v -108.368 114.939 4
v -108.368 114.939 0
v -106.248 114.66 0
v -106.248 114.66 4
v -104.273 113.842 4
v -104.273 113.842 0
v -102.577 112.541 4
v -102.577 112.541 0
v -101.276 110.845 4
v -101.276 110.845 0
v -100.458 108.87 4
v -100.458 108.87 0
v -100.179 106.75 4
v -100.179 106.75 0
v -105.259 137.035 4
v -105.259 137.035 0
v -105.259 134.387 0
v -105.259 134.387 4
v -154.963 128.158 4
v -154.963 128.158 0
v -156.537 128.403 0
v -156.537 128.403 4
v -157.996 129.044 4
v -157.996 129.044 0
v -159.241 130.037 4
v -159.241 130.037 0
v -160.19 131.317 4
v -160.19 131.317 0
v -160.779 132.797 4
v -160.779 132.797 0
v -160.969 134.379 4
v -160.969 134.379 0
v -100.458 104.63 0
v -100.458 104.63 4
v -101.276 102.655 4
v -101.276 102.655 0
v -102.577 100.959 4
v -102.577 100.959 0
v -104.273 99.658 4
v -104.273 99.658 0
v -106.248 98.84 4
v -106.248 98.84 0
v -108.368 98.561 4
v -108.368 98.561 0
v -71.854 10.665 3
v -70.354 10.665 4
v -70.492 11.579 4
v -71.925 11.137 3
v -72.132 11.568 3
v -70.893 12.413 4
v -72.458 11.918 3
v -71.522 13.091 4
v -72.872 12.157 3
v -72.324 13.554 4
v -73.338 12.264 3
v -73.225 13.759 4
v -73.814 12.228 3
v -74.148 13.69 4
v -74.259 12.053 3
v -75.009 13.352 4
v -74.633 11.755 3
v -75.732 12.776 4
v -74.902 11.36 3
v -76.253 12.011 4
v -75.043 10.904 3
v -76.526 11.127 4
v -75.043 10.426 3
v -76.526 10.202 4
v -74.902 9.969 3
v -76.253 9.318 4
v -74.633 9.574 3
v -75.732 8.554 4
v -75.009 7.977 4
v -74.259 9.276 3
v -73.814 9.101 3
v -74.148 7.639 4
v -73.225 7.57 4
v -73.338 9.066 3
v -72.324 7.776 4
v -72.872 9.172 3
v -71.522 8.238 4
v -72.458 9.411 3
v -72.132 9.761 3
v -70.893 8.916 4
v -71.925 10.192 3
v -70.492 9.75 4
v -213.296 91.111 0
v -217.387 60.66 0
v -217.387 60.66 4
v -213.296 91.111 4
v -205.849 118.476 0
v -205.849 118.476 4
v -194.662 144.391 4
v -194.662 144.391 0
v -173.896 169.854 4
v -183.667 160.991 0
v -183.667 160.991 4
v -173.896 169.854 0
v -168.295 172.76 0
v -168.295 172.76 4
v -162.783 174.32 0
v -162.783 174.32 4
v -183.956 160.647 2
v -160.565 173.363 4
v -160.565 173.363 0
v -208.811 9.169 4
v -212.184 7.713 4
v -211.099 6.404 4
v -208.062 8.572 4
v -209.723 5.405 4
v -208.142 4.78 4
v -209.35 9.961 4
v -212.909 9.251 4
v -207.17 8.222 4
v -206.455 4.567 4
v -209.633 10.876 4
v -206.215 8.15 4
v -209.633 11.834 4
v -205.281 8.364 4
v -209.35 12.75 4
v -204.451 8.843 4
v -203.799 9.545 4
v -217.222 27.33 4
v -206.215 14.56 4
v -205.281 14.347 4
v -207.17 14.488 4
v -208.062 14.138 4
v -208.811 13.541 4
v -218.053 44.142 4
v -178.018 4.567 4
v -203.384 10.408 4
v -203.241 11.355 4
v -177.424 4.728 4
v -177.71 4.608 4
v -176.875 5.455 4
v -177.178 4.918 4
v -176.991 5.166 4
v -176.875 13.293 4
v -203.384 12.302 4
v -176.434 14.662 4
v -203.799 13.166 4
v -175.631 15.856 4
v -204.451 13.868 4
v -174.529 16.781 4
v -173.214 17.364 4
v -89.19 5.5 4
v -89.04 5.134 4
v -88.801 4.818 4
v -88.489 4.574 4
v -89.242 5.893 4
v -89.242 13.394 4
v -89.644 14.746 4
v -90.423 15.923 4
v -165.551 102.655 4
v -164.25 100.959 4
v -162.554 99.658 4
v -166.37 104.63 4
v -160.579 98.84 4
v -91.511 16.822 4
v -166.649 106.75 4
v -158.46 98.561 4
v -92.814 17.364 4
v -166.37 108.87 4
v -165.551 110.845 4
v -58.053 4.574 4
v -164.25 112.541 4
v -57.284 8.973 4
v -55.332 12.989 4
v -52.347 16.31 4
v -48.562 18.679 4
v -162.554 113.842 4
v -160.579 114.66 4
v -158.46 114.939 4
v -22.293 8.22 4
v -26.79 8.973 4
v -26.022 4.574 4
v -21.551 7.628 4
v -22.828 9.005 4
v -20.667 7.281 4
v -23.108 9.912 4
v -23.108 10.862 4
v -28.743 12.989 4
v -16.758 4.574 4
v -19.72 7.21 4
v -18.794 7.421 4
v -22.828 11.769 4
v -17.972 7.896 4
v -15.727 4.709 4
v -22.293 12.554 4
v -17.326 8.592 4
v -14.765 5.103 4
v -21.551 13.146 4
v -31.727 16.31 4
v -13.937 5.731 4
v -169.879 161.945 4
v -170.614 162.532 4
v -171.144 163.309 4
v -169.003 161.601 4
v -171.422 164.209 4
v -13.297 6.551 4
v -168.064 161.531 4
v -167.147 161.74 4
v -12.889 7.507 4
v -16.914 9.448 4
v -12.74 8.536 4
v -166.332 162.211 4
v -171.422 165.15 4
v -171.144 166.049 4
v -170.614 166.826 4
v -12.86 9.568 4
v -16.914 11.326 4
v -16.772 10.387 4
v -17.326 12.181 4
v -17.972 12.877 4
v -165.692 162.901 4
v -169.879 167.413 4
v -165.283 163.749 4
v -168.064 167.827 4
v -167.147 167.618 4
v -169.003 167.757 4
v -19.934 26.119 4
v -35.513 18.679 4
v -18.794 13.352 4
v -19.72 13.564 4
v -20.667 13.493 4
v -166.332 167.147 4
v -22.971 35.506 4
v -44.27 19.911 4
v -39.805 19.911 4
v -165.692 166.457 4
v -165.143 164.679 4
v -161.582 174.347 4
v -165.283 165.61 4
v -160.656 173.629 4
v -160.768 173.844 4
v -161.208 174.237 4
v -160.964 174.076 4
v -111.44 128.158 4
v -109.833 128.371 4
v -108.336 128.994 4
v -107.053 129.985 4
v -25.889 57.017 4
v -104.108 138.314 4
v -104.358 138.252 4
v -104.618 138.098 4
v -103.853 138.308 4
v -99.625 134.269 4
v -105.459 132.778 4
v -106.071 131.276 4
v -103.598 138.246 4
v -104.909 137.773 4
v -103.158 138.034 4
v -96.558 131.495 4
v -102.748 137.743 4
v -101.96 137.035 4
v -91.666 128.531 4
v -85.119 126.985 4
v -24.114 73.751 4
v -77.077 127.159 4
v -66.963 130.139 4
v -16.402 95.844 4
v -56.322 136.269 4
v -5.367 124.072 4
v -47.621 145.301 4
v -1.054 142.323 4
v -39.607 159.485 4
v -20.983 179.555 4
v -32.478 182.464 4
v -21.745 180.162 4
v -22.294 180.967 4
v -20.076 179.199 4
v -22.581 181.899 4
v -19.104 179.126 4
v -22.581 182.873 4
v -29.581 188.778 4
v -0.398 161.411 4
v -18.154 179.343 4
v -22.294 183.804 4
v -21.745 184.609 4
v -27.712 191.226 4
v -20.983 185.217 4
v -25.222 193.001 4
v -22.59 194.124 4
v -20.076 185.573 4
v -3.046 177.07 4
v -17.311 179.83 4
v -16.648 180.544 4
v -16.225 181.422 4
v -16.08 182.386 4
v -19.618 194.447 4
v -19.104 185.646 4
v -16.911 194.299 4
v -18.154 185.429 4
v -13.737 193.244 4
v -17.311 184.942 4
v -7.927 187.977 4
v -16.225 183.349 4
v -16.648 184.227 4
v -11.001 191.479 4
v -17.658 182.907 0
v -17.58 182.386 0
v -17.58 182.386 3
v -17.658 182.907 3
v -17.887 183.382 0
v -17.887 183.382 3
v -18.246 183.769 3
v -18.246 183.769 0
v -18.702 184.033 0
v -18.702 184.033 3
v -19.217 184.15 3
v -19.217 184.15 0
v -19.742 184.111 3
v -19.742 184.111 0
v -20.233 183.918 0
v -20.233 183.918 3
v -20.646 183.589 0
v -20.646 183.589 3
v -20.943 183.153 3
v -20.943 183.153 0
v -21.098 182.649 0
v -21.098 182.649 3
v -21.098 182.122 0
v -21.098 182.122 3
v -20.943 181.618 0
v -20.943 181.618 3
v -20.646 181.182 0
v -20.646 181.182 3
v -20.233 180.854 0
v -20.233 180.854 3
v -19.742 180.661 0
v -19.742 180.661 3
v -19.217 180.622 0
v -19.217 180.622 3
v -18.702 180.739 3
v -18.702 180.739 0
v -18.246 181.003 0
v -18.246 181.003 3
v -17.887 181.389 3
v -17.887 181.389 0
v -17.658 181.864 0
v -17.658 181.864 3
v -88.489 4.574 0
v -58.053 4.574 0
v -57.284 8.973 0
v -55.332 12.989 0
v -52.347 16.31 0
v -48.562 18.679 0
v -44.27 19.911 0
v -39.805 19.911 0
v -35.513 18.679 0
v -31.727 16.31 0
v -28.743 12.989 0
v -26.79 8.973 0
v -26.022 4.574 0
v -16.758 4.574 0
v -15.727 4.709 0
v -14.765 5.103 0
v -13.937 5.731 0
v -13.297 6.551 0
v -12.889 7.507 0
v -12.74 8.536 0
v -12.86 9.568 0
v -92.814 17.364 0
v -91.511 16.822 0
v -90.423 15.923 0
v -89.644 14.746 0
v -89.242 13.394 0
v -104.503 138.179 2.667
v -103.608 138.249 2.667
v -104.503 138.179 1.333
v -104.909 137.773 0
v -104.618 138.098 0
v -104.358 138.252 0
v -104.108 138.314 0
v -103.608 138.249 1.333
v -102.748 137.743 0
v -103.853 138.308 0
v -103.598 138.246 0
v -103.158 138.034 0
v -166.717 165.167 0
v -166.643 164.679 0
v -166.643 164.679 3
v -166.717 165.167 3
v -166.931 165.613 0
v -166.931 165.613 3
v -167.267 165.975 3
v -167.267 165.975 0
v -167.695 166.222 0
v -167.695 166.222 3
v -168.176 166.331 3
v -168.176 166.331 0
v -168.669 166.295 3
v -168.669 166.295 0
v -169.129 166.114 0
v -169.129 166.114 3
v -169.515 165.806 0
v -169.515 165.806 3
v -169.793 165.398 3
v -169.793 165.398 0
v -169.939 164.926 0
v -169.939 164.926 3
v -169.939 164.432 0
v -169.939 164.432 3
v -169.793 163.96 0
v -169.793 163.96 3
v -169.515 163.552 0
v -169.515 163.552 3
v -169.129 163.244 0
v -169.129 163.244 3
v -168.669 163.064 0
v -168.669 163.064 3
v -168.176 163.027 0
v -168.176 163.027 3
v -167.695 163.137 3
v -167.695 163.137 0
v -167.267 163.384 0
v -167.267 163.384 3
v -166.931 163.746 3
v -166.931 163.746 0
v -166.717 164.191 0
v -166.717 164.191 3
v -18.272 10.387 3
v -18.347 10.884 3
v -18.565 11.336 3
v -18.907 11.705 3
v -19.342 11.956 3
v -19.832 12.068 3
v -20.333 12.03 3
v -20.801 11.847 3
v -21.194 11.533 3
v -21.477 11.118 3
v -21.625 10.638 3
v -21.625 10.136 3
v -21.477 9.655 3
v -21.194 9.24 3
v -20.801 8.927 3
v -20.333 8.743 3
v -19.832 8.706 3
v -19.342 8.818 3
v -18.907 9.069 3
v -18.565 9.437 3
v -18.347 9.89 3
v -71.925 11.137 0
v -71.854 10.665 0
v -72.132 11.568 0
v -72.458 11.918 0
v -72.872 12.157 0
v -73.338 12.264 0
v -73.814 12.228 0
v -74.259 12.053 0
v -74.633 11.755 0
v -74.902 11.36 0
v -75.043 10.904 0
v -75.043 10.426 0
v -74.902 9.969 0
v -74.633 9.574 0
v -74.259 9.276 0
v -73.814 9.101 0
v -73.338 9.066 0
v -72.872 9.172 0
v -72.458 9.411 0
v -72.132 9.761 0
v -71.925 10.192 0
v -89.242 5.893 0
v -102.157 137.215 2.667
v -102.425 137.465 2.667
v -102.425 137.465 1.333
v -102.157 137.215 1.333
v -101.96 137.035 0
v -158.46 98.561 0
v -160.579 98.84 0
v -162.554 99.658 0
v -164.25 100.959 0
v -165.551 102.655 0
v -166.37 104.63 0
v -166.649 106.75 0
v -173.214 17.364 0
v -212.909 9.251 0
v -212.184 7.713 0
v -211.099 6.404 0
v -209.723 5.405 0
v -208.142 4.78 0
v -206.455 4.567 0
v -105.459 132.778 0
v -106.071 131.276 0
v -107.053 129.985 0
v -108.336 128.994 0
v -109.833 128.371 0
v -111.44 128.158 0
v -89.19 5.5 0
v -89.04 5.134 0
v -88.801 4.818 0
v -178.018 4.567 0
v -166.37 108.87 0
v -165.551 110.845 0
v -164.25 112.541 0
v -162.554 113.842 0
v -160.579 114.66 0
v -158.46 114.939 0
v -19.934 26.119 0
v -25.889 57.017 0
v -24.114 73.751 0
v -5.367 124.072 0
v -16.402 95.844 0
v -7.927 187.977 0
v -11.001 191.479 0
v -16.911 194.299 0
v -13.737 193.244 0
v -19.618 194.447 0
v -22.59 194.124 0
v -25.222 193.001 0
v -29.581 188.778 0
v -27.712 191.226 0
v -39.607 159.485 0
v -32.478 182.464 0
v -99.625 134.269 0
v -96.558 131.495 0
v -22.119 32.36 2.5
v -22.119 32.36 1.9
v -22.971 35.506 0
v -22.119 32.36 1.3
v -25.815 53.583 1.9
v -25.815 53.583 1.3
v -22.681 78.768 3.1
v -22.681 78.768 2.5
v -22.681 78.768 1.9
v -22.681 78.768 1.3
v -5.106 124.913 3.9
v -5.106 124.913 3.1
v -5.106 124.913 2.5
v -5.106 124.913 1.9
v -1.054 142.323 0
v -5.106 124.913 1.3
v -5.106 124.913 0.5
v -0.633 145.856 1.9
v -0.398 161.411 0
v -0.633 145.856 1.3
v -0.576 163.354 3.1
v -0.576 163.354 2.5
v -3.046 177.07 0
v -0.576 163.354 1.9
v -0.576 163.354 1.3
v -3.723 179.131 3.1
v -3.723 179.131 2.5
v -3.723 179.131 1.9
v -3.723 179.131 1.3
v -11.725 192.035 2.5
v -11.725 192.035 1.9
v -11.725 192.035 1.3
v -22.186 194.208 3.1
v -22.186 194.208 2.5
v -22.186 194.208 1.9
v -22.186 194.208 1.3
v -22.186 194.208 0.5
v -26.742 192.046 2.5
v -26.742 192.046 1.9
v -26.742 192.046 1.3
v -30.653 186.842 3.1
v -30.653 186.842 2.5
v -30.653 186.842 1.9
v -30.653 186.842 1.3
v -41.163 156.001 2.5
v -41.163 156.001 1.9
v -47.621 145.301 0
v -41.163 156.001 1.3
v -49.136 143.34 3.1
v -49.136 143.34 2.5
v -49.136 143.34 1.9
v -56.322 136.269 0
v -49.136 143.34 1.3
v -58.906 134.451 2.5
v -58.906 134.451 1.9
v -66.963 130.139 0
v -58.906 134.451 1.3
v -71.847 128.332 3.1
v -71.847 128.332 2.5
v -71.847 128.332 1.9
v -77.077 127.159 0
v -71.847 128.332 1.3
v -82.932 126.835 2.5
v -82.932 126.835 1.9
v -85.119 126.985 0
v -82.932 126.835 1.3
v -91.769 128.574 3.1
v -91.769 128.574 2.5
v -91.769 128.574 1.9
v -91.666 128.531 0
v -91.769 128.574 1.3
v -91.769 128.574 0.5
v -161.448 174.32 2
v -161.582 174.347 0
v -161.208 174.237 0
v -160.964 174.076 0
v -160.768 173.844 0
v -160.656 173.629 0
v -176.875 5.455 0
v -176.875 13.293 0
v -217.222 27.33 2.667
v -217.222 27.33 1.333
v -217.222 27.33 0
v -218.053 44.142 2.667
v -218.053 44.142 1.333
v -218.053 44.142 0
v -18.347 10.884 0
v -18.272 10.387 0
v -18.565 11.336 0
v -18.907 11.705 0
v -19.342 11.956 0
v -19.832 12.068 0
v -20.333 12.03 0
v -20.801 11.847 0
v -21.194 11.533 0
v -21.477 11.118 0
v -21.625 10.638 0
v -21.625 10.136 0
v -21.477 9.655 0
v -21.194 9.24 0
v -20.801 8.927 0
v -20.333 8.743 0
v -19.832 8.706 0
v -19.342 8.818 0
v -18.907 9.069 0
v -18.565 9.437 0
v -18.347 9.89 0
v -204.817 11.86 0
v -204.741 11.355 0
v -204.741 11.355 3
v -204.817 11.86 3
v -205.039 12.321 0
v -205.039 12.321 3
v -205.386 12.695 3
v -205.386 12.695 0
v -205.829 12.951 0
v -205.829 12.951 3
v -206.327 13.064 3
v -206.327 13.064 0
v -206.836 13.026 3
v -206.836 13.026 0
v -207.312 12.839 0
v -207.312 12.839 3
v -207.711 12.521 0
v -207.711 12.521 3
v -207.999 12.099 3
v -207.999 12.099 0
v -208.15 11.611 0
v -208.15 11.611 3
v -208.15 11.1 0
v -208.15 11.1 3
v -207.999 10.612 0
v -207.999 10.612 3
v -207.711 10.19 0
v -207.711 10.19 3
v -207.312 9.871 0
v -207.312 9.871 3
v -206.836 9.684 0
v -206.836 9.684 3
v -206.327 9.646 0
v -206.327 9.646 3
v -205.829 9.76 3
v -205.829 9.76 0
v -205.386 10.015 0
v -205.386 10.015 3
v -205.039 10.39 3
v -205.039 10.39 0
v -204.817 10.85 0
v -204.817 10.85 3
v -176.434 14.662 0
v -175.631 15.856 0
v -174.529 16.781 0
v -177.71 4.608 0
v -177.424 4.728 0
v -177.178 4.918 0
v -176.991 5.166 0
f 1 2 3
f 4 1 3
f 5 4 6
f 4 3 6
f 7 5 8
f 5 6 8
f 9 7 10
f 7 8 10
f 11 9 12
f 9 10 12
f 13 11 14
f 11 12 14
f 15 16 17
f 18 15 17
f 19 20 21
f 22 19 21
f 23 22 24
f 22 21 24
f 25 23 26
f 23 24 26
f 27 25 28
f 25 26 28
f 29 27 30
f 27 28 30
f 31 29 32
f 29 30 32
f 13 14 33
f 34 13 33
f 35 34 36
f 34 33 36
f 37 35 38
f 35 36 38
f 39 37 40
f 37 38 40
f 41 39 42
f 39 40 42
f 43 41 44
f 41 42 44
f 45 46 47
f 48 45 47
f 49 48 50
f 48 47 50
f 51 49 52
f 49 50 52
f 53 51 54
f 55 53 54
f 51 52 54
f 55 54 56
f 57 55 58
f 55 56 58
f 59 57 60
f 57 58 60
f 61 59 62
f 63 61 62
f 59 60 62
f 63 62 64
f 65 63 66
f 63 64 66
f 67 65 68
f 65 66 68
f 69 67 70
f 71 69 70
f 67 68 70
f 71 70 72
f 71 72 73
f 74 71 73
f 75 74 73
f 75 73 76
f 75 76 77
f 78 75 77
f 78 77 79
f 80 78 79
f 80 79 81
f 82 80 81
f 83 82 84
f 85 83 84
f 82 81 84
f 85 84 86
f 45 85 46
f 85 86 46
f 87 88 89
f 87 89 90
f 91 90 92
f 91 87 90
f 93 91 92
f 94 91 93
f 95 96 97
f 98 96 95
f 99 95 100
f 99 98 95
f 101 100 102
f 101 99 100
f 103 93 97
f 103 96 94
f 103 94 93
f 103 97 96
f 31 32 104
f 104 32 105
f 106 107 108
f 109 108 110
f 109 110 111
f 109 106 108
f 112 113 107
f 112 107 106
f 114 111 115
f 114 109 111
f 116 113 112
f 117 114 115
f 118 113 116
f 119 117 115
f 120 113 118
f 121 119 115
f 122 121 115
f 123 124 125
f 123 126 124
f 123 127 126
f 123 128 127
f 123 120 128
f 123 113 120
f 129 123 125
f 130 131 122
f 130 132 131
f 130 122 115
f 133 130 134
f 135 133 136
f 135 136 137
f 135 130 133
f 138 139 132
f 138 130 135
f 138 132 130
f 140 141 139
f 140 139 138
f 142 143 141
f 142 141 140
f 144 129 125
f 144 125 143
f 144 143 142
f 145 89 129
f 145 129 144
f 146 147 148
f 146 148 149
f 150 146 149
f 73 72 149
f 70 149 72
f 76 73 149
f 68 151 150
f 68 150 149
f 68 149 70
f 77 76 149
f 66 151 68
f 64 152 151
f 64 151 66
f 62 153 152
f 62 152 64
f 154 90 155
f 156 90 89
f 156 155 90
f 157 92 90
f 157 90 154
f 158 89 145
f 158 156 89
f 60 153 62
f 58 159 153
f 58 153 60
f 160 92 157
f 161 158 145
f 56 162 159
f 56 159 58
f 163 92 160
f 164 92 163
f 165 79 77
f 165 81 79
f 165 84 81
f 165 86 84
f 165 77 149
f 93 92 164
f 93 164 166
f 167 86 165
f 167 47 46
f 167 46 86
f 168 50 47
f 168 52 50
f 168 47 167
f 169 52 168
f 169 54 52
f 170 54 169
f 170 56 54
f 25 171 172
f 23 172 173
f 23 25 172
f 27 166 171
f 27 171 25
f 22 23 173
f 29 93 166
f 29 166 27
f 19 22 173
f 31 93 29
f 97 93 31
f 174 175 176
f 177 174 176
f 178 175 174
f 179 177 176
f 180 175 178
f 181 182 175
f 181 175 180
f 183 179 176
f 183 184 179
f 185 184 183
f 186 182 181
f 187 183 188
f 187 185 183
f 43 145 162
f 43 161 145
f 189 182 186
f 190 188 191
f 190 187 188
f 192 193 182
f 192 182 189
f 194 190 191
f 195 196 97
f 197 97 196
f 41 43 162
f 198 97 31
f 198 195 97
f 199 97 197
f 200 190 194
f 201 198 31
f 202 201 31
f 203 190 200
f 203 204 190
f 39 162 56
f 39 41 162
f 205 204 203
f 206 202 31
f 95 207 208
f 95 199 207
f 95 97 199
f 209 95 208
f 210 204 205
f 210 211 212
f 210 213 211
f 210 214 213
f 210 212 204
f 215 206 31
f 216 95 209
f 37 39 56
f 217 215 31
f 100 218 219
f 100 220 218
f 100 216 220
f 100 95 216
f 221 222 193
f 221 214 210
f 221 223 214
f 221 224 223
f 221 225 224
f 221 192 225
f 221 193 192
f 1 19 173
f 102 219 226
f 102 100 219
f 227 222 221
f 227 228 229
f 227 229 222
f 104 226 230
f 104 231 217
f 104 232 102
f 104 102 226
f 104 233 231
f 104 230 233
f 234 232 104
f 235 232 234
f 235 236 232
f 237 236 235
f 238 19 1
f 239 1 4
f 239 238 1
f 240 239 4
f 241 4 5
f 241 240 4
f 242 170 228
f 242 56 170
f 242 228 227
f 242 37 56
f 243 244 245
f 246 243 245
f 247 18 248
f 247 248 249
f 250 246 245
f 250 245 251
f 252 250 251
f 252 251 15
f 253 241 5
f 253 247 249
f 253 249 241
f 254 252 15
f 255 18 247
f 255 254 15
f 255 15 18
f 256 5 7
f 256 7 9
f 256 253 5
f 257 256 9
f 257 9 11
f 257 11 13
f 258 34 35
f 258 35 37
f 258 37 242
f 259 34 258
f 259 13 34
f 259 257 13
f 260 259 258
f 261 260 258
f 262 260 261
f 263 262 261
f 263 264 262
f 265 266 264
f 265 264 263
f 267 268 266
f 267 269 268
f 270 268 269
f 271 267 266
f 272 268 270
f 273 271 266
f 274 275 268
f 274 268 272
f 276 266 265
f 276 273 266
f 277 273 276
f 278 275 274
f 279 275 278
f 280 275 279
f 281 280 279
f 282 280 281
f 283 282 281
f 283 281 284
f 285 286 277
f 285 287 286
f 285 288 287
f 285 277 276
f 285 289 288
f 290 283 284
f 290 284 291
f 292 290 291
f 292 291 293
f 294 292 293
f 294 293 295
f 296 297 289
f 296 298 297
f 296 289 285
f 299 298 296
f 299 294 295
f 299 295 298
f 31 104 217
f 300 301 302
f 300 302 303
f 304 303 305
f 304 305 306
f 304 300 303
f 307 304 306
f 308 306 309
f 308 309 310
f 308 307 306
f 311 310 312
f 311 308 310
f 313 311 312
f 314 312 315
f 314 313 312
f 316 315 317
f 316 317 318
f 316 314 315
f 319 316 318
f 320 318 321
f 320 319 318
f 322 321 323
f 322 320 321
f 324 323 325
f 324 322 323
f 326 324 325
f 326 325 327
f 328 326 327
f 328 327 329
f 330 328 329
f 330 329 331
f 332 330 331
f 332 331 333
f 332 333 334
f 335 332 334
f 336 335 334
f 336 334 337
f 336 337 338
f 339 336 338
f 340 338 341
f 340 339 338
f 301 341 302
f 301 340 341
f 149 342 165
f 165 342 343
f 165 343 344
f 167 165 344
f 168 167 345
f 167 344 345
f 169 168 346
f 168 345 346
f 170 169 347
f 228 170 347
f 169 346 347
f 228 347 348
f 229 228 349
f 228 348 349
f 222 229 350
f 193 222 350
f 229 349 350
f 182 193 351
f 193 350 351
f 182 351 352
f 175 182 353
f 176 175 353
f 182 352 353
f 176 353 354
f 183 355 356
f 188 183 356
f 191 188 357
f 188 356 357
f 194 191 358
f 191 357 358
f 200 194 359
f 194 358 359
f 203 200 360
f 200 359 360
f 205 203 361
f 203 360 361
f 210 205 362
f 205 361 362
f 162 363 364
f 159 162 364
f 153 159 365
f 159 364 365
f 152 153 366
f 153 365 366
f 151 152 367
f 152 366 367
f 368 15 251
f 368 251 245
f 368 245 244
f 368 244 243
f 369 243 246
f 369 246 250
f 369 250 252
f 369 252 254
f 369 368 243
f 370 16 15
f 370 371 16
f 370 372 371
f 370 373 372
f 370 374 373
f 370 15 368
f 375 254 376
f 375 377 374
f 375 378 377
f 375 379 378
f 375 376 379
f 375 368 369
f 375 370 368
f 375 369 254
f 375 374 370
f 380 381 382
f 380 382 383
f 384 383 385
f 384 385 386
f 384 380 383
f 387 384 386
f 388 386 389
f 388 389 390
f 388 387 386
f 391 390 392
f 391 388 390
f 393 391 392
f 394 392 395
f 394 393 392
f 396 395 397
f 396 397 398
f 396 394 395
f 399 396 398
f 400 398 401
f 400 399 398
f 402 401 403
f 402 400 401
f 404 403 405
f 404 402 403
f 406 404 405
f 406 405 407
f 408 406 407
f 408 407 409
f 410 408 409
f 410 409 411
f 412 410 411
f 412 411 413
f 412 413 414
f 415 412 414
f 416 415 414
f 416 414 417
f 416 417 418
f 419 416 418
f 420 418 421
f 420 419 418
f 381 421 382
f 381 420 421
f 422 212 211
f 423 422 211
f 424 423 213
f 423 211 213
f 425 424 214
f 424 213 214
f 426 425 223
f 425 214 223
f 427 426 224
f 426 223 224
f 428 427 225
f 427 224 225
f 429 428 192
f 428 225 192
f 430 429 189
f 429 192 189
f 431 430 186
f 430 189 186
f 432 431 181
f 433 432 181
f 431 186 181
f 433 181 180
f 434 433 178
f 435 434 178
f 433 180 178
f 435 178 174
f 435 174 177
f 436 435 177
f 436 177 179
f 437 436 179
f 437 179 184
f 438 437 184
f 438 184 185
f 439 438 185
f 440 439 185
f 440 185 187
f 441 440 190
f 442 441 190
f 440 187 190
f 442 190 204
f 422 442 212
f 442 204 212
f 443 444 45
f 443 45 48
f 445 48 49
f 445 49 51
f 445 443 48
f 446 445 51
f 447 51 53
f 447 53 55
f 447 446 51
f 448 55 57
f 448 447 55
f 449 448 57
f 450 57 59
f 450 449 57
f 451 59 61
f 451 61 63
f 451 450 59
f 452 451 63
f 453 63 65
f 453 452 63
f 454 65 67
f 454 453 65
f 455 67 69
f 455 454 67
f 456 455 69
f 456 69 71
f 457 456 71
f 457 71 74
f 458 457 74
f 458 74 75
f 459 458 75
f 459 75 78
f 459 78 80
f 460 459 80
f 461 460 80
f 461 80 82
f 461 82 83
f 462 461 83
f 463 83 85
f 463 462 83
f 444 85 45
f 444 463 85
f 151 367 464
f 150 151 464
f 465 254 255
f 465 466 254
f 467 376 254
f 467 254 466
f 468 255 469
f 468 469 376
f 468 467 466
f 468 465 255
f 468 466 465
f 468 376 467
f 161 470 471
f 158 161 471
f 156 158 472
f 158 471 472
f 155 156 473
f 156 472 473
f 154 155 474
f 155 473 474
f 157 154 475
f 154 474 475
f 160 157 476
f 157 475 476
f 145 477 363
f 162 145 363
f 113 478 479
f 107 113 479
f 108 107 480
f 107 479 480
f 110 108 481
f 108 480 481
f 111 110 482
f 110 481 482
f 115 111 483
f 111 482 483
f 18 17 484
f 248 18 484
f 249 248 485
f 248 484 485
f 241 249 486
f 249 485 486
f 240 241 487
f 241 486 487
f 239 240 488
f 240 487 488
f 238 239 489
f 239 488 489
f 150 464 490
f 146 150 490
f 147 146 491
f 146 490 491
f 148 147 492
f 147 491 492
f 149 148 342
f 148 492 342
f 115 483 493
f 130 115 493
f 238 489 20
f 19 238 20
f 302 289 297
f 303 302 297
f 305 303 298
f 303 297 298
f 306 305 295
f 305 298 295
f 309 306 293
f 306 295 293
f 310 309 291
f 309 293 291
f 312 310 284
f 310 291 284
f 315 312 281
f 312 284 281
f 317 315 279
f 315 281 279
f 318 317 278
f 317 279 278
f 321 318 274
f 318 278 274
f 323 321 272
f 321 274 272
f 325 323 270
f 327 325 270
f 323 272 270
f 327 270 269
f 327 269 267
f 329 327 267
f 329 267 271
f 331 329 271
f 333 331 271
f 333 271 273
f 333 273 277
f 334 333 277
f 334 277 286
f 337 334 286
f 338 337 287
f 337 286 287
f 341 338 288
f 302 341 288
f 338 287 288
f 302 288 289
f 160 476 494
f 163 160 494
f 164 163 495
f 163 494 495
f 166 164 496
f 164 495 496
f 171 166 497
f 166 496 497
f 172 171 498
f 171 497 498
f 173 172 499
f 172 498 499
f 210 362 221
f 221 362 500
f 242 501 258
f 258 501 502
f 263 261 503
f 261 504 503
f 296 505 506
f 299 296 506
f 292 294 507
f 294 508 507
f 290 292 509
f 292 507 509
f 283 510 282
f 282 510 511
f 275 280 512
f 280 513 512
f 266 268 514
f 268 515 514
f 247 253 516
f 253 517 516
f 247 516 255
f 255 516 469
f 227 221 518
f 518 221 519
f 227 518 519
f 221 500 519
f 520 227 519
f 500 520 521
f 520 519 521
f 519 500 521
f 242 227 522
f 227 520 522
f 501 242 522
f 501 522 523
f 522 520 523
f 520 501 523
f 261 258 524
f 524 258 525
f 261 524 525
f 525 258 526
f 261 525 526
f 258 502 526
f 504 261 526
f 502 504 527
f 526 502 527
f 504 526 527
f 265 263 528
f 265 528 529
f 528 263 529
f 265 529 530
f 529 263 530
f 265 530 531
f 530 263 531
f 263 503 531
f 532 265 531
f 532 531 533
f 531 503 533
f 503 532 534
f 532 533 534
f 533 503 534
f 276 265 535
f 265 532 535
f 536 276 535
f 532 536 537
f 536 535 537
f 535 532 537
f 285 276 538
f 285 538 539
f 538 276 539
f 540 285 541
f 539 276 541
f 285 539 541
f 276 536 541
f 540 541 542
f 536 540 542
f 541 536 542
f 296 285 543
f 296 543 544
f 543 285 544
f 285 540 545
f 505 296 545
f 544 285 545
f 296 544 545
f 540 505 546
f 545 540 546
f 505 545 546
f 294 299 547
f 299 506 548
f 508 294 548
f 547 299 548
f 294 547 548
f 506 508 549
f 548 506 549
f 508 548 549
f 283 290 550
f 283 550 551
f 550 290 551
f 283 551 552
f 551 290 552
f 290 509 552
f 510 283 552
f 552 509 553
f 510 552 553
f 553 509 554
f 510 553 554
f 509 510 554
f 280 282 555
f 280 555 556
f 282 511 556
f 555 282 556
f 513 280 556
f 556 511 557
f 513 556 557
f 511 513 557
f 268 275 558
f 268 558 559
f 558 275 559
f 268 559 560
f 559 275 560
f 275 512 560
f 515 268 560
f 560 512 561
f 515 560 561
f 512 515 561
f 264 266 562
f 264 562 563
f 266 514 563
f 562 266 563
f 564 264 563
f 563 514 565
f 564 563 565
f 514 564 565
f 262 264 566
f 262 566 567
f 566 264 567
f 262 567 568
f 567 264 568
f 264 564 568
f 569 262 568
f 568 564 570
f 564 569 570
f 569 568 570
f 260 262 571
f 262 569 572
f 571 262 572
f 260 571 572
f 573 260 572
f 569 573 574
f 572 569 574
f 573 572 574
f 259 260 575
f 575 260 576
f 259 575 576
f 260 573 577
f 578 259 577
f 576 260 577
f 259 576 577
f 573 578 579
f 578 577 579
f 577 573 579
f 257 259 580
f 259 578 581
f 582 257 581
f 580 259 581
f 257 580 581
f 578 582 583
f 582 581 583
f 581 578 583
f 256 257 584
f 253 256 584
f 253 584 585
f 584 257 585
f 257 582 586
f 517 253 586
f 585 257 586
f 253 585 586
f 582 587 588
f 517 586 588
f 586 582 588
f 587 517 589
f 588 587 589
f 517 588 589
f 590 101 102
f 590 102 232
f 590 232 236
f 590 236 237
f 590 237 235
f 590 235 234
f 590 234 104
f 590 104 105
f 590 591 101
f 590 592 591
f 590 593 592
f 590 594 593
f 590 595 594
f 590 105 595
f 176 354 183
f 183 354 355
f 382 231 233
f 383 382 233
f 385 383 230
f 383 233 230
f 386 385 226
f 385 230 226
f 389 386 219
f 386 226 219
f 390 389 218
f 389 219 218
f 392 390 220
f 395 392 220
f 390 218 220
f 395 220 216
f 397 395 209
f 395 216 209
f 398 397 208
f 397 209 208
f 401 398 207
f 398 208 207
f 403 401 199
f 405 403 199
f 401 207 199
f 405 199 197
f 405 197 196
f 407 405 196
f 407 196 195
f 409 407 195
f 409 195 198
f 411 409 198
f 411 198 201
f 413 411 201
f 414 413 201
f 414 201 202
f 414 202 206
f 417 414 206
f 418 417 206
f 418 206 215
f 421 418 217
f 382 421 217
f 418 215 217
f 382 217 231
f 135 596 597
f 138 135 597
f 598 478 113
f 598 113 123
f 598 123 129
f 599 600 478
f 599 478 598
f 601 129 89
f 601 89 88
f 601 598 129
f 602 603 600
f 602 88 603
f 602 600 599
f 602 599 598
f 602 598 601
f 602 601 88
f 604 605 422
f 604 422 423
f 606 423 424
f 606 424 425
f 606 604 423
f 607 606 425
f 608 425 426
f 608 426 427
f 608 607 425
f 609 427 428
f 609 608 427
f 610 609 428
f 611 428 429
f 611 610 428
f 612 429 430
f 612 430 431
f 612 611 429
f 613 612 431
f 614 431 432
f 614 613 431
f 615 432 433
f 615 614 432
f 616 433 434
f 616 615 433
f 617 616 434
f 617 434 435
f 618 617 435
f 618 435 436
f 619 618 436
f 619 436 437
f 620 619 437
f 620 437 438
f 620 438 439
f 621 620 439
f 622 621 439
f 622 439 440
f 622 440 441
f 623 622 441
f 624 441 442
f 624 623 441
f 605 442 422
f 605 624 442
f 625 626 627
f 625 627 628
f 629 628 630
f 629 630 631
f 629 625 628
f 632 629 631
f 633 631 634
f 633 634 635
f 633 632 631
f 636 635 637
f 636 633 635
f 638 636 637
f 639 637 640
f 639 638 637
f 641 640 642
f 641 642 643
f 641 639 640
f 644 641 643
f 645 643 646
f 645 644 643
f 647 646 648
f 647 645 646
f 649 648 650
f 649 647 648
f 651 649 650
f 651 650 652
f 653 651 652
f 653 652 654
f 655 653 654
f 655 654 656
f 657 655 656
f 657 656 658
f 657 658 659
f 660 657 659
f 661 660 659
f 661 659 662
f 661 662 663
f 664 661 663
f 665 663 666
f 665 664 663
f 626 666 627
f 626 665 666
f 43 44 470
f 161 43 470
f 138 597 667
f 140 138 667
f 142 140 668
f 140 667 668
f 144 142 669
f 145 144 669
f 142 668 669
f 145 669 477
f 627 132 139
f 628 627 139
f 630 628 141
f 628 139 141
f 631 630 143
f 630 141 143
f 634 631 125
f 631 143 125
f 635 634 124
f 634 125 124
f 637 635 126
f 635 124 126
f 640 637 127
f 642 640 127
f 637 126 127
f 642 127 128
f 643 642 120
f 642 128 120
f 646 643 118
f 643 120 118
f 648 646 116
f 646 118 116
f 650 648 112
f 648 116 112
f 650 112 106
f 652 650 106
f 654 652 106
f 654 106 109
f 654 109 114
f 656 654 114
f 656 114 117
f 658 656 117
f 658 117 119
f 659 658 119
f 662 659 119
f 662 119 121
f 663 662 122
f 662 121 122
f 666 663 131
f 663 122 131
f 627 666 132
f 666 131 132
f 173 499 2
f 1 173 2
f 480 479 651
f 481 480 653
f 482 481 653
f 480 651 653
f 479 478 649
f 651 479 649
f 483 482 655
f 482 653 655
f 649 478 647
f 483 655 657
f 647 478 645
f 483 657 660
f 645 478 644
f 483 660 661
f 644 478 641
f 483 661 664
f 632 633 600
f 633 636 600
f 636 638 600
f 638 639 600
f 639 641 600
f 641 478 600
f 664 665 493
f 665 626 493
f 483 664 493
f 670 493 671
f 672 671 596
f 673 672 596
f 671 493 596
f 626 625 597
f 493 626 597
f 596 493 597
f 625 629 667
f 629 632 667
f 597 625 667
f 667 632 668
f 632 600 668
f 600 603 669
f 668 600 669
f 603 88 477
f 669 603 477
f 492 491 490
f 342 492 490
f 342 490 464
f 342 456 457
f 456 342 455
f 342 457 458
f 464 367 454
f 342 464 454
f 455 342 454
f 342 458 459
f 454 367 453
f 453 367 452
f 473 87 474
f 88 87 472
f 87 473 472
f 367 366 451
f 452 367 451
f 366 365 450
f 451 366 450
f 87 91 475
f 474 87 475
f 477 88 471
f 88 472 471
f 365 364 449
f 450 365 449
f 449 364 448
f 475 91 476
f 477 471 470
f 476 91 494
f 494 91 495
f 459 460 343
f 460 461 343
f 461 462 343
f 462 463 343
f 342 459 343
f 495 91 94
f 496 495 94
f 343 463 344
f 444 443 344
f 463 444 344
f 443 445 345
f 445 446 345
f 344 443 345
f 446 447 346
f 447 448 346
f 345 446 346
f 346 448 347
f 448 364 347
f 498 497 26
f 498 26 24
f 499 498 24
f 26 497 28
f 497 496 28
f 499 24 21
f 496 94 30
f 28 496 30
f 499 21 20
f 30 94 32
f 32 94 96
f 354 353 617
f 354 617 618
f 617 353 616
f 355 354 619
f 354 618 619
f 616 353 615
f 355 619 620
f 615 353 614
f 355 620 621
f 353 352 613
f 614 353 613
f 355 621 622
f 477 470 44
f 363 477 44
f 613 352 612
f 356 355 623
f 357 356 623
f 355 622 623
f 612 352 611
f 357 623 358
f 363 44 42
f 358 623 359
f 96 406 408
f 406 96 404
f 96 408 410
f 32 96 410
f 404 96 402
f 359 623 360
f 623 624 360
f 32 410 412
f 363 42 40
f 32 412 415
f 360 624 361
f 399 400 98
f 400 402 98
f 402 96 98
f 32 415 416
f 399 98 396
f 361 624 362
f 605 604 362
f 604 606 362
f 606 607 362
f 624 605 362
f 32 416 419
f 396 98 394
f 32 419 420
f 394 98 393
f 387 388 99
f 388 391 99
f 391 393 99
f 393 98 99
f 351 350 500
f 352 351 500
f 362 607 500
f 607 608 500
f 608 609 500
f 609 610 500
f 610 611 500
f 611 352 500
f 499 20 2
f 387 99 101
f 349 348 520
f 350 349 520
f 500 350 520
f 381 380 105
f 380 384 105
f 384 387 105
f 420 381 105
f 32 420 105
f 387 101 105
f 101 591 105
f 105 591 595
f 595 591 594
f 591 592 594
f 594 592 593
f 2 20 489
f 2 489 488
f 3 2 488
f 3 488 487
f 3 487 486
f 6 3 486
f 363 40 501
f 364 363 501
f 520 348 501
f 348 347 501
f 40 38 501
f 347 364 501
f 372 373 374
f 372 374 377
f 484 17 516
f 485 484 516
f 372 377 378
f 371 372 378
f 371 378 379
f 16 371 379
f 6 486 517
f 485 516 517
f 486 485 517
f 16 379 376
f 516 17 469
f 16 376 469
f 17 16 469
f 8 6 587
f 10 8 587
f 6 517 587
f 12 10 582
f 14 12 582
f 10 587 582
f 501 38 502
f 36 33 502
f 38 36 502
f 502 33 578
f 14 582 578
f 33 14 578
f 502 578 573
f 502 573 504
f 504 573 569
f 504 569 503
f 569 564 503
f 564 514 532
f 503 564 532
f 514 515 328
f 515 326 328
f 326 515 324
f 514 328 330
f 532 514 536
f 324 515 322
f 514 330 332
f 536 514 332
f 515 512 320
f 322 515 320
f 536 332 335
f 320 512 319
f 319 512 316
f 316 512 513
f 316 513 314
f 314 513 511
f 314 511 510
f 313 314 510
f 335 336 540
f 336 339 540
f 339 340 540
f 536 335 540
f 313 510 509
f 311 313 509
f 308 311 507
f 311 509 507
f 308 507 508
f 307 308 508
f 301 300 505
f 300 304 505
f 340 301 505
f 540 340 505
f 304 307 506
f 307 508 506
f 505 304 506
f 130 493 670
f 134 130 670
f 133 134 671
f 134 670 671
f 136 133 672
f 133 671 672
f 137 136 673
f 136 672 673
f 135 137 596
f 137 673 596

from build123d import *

# Parameters (mm, degrees)
F0_R       = 1.7137957533
F0_R_2     = 1.6034906091
F0_R_3     = 1.685614788
F0_R_4     = 1.6570388641
F0_R_5     = 1.7691617442
F1_DEPTH   = 4
F2_SIZE2   = 1.5
F2_SIZE    = 1
F2_2_SIZE2 = 1.5
F2_2_SIZE  = 1
F2_3_SIZE2 = 1.5
F2_3_SIZE  = 1
F2_4_SIZE2 = 1.5
F2_4_SIZE  = 1
F2_5_SIZE2 = 1.5
F2_5_SIZE  = 1


with BuildPart() as f1:
    # F0 (on Top) → F1 (new body)
    with BuildSketch(Plane.XY):
        with BuildLine():
            Line((-206.4548621972, 4.5668855309), (-178.0181527138, 4.5668855309))
            ThreePointArc((-178.0181527138, 4.5668855309), (-177.2946106698, 4.8149329067), (-176.8754422665, 5.45472853))
            Line((-176.8754422665, 5.45472853), (-176.8754422665, 13.292837158))
            ThreePointArc((-176.8754422665, 13.292837158), (-175.6314199114, 15.8560897894), (-173.2141780447, 17.3643329495))
            Line((-173.2141780447, 17.3643329495), (-133.0140852455, 17.3643329495))
            Line((-133.0140852455, 17.3643329495), (-92.8139924463, 17.3643329495))
            ThreePointArc((-92.8139924463, 17.3643329495), (-90.4231515022, 15.9229215382), (-89.2415046692, 13.3935939521))
            Line((-89.2415046692, 13.3935939521), (-89.2415046692, 5.8930651285))
            ThreePointArc((-89.2415046692, 5.8930651285), (-89.0400994317, 5.1339188794), (-88.4888599025, 4.5744529925))
            Line((-88.4888599025, 4.5744529925), (-58.0529485365, 4.5744529925))
            ThreePointArc((-58.0529485365, 4.5744529925), (-42.0373054221, 20.06691348), (-26.0216623078, 4.5744529925))
            Line((-26.0216623078, 4.5744529925), (-16.7578458786, 4.5744529925))
            ThreePointArc((-16.7578458786, 4.5744529925), (-13.5903709431, 6.1203055895), (-12.8601361066, 9.5683941618))
            add(Edge.make_bspline(
                [(-12.8601361066, 9.5683941618), (-14.4419394883, 13.153197368), (-17.7583873794, 20.6691839759), (-23.1955089468, 33.9241487747), (-24.7245843187, 46.0156253183), (-26.241283277, 53.3880164759), (-25.5181145548, 69.1102297233), (-22.8548176135, 78.4720421574), (-18.9932861428, 90.0249281337), (-13.3524059023, 102.8557382885), (-8.6807006404, 113.9152927053), (-4.6731289799, 125.9323734541), (-1.9004218024, 136.2590604635), (-0.5124121995, 145.6928944313), (0.0160125721, 154.6658811388), (-0.3196757003, 161.110374556), (-0.9789516351, 167.334926556), (-2.4137248416, 175.0513102078), (-3.6235332733, 179.0663742562), (-6.0973095505, 185.2799630355), (-9.0680488733, 189.8163898599), (-11.8279621528, 192.2895722469), (-15.0580662208, 193.985526289), (-17.7995823511, 194.4863049572), (-19.6246218708, 194.4680962646), (-22.2582546575, 194.28576931), (-23.8843015475, 193.728652156), (-26.7182688502, 192.2427740805), (-28.9690041252, 190.0839219996), (-31.7159778253, 184.9987721733), (-33.6303540491, 178.9658244394), (-36.1317893146, 169.0161004986), (-40.6353026181, 155.5913803205), (-49.2506530573, 142.2531836781), (-58.2765490204, 134.112360818), (-71.5436824587, 127.680983456), (-82.0391662971, 126.4135894599), (-89.7132365456, 127.5552865106), (-94.3522170294, 129.6810139803), (-97.8612720312, 132.5194831553), (-100.2084739021, 134.773157247), (-101.4958874209, 136.5264559993), (-101.9604951143, 137.0353996754)],
                knots=[0, 0, 0, 0, 0.0315757342, 0.0662127675, 0.0973126387, 0.122597542, 0.1579570967, 0.1868044469, 0.2181409195, 0.2522233071, 0.2838918337, 0.316087422, 0.345793341, 0.3738810624, 0.4009972207, 0.4238391162, 0.4467872305, 0.4719020696, 0.4908037559, 0.5140691381, 0.5353003415, 0.5526119548, 0.5698454963, 0.5847406769, 0.5971344449, 0.6115554213, 0.6236534888, 0.6394443619, 0.655544576, 0.6769073055, 0.6998133256, 0.728609185, 0.7631329869, 0.7990488516, 0.8307940294, 0.8652917163, 0.894862341, 0.9196874704, 0.9400215292, 0.9590693586, 0.9757243561, 0.990658127, 0.990658127, 0.990658127, 0.990658127], degree=3))
            add(Edge.make_bspline(
                [(-102.7484023558, 137.7433848054), (-102.4016484053, 137.4658046821), (-102.116368464, 137.1652926106), (-101.9604951143, 137.0353996754)],
                knots=[2.2870356705, 2.2870356705, 2.2870356705, 2.2870356705, 3.2981932163, 3.2981932163, 3.2981932163, 3.2981932163], degree=3))
            add(Edge.make_bspline(
                [(-105.2586883307, 137.0353996754), (-104.6314630788, 138.8817321752), (-103.532690281, 138.3712154001), (-102.7484023558, 137.7433848054)],
                knots=[0, 0, 0, 0, 2.2870356705, 2.2870356705, 2.2870356705, 2.2870356705], degree=3))
            Line((-105.2586883307, 137.0353996754), (-105.2586883307, 134.3867480755))
            ThreePointArc((-105.2586883307, 134.3867480755), (-107.0526037177, 129.9854572787), (-111.4402115345, 128.1583309174))
            Line((-111.4402115345, 128.1583309174), (-154.9625843763, 128.1583309174))
            ThreePointArc((-154.9625843763, 128.1583309174), (-159.2411314143, 130.0371525939), (-160.9690189362, 134.3788504601))
            Line((-160.9690189362, 134.3788504601), (-160.5646806861, 173.3625012135))
            add(Edge.make_bspline(
                [(-162.7825945616, 174.3203997612), (-162.2442901134, 174.3634641171), (-161.4137651508, 174.4625987693), (-160.7370525599, 173.9974319935), (-160.5646806861, 173.3625012135)],
                knots=[0, 0, 0, 0, 0.503055423, 1, 1, 1, 1], degree=3))
            add(Edge.make_bspline(
                [(-217.3868478098, 60.6602545923), (-214.5885273326, 104.2862519693), (-191.1178872443, 161.6993073051), (-169.6297675371, 173.0930805206), (-162.7825945616, 174.3203997612)],
                knots=[0, 0, 0, 0, 0.6716149602, 1, 1, 1, 1], degree=3))
            add(Edge.make_bspline(
                [(-212.9089032328, 9.2512788207), (-219.624504447, 28.2878503203), (-218.1405937576, 43.9638467883), (-217.3868478098, 60.6602545923)],
                knots=[0, 0, 0, 0, 51.6036314373, 51.6036314373, 51.6036314373, 51.6036314373], degree=3))
            ThreePointArc((-212.9089032328, 9.2512788207), (-210.4422857445, 5.861417718), (-206.4548621972, 4.5668855309))
        make_face()
        with Locations((-206.4548621972, 11.3551911074)):
            Circle(F0_R, mode=Mode.SUBTRACT)
        with Locations((-73.4573453665, 10.6646250933)):
            Circle(F0_R_2, mode=Mode.SUBTRACT)
        with Locations((-19.9580665376, 10.3868395781)):
            Circle(F0_R_3, mode=Mode.SUBTRACT)
        with BuildLine():
            Line((-108.3676440611, 98.5609218478), (-158.4595369205, 98.5609218478))
            ThreePointArc((-158.4595369205, 98.5609218478), (-164.2500343517, 100.9594244167), (-166.6485369205, 106.7499218478))
            Line((-166.6485369205, 106.7499218478), (-166.6485369205, 106.7501978979))
            ThreePointArc((-166.6485369205, 106.7501978979), (-164.2500343517, 112.540695329), (-158.4595369205, 114.9391978979))
            Line((-158.4595369205, 114.9391978979), (-108.3676440611, 114.9391978979))
            ThreePointArc((-108.3676440611, 114.9391978979), (-102.57714663, 112.540695329), (-100.1786440611, 106.7501978979))
            Line((-100.1786440611, 106.7501978979), (-100.1786440611, 106.7499218478))
            ThreePointArc((-100.1786440611, 106.7499218478), (-102.57714663, 100.9594244167), (-108.3676440611, 98.5609218478))
        make_face(mode=Mode.SUBTRACT)
        with Locations((-168.3000388534, 164.6790622287)):
            Circle(F0_R_4, mode=Mode.SUBTRACT)
        with Locations((-19.3487956989, 182.3857604731)):
            Circle(F0_R_5, mode=Mode.SUBTRACT)
    extrude(amount=F1_DEPTH)

    # F2
    f2_edges = [f1.edges().sort_by_distance(p)[0] for p in [
        (-169.957078, 164.679062, 4),
    ]]
    f2_side = f1.faces().sort_by_distance((-169.957078, 164.679062, 2))[0]
    chamfer(f2_edges, length=F2_SIZE, length2=F2_SIZE2, reference=f2_side)

    # F2#2
    f2_2_edges = [f1.edges().sort_by_distance(p)[0] for p in [
        (-21.117957, 182.38576, 4),
    ]]
    f2_2_side = f1.faces().sort_by_distance((-21.117957, 182.38576, 2))[0]
    chamfer(f2_2_edges, length=F2_2_SIZE, length2=F2_2_SIZE2, reference=f2_2_side)

    # F2#3
    f2_3_edges = [f1.edges().sort_by_distance(p)[0] for p in [
        (-21.643681, 10.38684, 4),
    ]]
    f2_3_side = f1.faces().sort_by_distance((-21.643681, 10.38684, 2))[0]
    chamfer(f2_3_edges, length=F2_3_SIZE, length2=F2_3_SIZE2, reference=f2_3_side)

    # F2#4
    f2_4_edges = [f1.edges().sort_by_distance(p)[0] for p in [
        (-75.060836, 10.664625, 4),
    ]]
    f2_4_side = f1.faces().sort_by_distance((-75.060836, 10.664625, 2))[0]
    chamfer(f2_4_edges, length=F2_4_SIZE, length2=F2_4_SIZE2, reference=f2_4_side)

    # F2#5
    f2_5_edges = [f1.edges().sort_by_distance(p)[0] for p in [
        (-208.168658, 11.355191, 4),
    ]]
    f2_5_side = f1.faces().sort_by_distance((-208.168658, 11.355191, 2))[0]
    chamfer(f2_5_edges, length=F2_5_SIZE, length2=F2_5_SIZE2, reference=f2_5_side)


solid = f1.part
